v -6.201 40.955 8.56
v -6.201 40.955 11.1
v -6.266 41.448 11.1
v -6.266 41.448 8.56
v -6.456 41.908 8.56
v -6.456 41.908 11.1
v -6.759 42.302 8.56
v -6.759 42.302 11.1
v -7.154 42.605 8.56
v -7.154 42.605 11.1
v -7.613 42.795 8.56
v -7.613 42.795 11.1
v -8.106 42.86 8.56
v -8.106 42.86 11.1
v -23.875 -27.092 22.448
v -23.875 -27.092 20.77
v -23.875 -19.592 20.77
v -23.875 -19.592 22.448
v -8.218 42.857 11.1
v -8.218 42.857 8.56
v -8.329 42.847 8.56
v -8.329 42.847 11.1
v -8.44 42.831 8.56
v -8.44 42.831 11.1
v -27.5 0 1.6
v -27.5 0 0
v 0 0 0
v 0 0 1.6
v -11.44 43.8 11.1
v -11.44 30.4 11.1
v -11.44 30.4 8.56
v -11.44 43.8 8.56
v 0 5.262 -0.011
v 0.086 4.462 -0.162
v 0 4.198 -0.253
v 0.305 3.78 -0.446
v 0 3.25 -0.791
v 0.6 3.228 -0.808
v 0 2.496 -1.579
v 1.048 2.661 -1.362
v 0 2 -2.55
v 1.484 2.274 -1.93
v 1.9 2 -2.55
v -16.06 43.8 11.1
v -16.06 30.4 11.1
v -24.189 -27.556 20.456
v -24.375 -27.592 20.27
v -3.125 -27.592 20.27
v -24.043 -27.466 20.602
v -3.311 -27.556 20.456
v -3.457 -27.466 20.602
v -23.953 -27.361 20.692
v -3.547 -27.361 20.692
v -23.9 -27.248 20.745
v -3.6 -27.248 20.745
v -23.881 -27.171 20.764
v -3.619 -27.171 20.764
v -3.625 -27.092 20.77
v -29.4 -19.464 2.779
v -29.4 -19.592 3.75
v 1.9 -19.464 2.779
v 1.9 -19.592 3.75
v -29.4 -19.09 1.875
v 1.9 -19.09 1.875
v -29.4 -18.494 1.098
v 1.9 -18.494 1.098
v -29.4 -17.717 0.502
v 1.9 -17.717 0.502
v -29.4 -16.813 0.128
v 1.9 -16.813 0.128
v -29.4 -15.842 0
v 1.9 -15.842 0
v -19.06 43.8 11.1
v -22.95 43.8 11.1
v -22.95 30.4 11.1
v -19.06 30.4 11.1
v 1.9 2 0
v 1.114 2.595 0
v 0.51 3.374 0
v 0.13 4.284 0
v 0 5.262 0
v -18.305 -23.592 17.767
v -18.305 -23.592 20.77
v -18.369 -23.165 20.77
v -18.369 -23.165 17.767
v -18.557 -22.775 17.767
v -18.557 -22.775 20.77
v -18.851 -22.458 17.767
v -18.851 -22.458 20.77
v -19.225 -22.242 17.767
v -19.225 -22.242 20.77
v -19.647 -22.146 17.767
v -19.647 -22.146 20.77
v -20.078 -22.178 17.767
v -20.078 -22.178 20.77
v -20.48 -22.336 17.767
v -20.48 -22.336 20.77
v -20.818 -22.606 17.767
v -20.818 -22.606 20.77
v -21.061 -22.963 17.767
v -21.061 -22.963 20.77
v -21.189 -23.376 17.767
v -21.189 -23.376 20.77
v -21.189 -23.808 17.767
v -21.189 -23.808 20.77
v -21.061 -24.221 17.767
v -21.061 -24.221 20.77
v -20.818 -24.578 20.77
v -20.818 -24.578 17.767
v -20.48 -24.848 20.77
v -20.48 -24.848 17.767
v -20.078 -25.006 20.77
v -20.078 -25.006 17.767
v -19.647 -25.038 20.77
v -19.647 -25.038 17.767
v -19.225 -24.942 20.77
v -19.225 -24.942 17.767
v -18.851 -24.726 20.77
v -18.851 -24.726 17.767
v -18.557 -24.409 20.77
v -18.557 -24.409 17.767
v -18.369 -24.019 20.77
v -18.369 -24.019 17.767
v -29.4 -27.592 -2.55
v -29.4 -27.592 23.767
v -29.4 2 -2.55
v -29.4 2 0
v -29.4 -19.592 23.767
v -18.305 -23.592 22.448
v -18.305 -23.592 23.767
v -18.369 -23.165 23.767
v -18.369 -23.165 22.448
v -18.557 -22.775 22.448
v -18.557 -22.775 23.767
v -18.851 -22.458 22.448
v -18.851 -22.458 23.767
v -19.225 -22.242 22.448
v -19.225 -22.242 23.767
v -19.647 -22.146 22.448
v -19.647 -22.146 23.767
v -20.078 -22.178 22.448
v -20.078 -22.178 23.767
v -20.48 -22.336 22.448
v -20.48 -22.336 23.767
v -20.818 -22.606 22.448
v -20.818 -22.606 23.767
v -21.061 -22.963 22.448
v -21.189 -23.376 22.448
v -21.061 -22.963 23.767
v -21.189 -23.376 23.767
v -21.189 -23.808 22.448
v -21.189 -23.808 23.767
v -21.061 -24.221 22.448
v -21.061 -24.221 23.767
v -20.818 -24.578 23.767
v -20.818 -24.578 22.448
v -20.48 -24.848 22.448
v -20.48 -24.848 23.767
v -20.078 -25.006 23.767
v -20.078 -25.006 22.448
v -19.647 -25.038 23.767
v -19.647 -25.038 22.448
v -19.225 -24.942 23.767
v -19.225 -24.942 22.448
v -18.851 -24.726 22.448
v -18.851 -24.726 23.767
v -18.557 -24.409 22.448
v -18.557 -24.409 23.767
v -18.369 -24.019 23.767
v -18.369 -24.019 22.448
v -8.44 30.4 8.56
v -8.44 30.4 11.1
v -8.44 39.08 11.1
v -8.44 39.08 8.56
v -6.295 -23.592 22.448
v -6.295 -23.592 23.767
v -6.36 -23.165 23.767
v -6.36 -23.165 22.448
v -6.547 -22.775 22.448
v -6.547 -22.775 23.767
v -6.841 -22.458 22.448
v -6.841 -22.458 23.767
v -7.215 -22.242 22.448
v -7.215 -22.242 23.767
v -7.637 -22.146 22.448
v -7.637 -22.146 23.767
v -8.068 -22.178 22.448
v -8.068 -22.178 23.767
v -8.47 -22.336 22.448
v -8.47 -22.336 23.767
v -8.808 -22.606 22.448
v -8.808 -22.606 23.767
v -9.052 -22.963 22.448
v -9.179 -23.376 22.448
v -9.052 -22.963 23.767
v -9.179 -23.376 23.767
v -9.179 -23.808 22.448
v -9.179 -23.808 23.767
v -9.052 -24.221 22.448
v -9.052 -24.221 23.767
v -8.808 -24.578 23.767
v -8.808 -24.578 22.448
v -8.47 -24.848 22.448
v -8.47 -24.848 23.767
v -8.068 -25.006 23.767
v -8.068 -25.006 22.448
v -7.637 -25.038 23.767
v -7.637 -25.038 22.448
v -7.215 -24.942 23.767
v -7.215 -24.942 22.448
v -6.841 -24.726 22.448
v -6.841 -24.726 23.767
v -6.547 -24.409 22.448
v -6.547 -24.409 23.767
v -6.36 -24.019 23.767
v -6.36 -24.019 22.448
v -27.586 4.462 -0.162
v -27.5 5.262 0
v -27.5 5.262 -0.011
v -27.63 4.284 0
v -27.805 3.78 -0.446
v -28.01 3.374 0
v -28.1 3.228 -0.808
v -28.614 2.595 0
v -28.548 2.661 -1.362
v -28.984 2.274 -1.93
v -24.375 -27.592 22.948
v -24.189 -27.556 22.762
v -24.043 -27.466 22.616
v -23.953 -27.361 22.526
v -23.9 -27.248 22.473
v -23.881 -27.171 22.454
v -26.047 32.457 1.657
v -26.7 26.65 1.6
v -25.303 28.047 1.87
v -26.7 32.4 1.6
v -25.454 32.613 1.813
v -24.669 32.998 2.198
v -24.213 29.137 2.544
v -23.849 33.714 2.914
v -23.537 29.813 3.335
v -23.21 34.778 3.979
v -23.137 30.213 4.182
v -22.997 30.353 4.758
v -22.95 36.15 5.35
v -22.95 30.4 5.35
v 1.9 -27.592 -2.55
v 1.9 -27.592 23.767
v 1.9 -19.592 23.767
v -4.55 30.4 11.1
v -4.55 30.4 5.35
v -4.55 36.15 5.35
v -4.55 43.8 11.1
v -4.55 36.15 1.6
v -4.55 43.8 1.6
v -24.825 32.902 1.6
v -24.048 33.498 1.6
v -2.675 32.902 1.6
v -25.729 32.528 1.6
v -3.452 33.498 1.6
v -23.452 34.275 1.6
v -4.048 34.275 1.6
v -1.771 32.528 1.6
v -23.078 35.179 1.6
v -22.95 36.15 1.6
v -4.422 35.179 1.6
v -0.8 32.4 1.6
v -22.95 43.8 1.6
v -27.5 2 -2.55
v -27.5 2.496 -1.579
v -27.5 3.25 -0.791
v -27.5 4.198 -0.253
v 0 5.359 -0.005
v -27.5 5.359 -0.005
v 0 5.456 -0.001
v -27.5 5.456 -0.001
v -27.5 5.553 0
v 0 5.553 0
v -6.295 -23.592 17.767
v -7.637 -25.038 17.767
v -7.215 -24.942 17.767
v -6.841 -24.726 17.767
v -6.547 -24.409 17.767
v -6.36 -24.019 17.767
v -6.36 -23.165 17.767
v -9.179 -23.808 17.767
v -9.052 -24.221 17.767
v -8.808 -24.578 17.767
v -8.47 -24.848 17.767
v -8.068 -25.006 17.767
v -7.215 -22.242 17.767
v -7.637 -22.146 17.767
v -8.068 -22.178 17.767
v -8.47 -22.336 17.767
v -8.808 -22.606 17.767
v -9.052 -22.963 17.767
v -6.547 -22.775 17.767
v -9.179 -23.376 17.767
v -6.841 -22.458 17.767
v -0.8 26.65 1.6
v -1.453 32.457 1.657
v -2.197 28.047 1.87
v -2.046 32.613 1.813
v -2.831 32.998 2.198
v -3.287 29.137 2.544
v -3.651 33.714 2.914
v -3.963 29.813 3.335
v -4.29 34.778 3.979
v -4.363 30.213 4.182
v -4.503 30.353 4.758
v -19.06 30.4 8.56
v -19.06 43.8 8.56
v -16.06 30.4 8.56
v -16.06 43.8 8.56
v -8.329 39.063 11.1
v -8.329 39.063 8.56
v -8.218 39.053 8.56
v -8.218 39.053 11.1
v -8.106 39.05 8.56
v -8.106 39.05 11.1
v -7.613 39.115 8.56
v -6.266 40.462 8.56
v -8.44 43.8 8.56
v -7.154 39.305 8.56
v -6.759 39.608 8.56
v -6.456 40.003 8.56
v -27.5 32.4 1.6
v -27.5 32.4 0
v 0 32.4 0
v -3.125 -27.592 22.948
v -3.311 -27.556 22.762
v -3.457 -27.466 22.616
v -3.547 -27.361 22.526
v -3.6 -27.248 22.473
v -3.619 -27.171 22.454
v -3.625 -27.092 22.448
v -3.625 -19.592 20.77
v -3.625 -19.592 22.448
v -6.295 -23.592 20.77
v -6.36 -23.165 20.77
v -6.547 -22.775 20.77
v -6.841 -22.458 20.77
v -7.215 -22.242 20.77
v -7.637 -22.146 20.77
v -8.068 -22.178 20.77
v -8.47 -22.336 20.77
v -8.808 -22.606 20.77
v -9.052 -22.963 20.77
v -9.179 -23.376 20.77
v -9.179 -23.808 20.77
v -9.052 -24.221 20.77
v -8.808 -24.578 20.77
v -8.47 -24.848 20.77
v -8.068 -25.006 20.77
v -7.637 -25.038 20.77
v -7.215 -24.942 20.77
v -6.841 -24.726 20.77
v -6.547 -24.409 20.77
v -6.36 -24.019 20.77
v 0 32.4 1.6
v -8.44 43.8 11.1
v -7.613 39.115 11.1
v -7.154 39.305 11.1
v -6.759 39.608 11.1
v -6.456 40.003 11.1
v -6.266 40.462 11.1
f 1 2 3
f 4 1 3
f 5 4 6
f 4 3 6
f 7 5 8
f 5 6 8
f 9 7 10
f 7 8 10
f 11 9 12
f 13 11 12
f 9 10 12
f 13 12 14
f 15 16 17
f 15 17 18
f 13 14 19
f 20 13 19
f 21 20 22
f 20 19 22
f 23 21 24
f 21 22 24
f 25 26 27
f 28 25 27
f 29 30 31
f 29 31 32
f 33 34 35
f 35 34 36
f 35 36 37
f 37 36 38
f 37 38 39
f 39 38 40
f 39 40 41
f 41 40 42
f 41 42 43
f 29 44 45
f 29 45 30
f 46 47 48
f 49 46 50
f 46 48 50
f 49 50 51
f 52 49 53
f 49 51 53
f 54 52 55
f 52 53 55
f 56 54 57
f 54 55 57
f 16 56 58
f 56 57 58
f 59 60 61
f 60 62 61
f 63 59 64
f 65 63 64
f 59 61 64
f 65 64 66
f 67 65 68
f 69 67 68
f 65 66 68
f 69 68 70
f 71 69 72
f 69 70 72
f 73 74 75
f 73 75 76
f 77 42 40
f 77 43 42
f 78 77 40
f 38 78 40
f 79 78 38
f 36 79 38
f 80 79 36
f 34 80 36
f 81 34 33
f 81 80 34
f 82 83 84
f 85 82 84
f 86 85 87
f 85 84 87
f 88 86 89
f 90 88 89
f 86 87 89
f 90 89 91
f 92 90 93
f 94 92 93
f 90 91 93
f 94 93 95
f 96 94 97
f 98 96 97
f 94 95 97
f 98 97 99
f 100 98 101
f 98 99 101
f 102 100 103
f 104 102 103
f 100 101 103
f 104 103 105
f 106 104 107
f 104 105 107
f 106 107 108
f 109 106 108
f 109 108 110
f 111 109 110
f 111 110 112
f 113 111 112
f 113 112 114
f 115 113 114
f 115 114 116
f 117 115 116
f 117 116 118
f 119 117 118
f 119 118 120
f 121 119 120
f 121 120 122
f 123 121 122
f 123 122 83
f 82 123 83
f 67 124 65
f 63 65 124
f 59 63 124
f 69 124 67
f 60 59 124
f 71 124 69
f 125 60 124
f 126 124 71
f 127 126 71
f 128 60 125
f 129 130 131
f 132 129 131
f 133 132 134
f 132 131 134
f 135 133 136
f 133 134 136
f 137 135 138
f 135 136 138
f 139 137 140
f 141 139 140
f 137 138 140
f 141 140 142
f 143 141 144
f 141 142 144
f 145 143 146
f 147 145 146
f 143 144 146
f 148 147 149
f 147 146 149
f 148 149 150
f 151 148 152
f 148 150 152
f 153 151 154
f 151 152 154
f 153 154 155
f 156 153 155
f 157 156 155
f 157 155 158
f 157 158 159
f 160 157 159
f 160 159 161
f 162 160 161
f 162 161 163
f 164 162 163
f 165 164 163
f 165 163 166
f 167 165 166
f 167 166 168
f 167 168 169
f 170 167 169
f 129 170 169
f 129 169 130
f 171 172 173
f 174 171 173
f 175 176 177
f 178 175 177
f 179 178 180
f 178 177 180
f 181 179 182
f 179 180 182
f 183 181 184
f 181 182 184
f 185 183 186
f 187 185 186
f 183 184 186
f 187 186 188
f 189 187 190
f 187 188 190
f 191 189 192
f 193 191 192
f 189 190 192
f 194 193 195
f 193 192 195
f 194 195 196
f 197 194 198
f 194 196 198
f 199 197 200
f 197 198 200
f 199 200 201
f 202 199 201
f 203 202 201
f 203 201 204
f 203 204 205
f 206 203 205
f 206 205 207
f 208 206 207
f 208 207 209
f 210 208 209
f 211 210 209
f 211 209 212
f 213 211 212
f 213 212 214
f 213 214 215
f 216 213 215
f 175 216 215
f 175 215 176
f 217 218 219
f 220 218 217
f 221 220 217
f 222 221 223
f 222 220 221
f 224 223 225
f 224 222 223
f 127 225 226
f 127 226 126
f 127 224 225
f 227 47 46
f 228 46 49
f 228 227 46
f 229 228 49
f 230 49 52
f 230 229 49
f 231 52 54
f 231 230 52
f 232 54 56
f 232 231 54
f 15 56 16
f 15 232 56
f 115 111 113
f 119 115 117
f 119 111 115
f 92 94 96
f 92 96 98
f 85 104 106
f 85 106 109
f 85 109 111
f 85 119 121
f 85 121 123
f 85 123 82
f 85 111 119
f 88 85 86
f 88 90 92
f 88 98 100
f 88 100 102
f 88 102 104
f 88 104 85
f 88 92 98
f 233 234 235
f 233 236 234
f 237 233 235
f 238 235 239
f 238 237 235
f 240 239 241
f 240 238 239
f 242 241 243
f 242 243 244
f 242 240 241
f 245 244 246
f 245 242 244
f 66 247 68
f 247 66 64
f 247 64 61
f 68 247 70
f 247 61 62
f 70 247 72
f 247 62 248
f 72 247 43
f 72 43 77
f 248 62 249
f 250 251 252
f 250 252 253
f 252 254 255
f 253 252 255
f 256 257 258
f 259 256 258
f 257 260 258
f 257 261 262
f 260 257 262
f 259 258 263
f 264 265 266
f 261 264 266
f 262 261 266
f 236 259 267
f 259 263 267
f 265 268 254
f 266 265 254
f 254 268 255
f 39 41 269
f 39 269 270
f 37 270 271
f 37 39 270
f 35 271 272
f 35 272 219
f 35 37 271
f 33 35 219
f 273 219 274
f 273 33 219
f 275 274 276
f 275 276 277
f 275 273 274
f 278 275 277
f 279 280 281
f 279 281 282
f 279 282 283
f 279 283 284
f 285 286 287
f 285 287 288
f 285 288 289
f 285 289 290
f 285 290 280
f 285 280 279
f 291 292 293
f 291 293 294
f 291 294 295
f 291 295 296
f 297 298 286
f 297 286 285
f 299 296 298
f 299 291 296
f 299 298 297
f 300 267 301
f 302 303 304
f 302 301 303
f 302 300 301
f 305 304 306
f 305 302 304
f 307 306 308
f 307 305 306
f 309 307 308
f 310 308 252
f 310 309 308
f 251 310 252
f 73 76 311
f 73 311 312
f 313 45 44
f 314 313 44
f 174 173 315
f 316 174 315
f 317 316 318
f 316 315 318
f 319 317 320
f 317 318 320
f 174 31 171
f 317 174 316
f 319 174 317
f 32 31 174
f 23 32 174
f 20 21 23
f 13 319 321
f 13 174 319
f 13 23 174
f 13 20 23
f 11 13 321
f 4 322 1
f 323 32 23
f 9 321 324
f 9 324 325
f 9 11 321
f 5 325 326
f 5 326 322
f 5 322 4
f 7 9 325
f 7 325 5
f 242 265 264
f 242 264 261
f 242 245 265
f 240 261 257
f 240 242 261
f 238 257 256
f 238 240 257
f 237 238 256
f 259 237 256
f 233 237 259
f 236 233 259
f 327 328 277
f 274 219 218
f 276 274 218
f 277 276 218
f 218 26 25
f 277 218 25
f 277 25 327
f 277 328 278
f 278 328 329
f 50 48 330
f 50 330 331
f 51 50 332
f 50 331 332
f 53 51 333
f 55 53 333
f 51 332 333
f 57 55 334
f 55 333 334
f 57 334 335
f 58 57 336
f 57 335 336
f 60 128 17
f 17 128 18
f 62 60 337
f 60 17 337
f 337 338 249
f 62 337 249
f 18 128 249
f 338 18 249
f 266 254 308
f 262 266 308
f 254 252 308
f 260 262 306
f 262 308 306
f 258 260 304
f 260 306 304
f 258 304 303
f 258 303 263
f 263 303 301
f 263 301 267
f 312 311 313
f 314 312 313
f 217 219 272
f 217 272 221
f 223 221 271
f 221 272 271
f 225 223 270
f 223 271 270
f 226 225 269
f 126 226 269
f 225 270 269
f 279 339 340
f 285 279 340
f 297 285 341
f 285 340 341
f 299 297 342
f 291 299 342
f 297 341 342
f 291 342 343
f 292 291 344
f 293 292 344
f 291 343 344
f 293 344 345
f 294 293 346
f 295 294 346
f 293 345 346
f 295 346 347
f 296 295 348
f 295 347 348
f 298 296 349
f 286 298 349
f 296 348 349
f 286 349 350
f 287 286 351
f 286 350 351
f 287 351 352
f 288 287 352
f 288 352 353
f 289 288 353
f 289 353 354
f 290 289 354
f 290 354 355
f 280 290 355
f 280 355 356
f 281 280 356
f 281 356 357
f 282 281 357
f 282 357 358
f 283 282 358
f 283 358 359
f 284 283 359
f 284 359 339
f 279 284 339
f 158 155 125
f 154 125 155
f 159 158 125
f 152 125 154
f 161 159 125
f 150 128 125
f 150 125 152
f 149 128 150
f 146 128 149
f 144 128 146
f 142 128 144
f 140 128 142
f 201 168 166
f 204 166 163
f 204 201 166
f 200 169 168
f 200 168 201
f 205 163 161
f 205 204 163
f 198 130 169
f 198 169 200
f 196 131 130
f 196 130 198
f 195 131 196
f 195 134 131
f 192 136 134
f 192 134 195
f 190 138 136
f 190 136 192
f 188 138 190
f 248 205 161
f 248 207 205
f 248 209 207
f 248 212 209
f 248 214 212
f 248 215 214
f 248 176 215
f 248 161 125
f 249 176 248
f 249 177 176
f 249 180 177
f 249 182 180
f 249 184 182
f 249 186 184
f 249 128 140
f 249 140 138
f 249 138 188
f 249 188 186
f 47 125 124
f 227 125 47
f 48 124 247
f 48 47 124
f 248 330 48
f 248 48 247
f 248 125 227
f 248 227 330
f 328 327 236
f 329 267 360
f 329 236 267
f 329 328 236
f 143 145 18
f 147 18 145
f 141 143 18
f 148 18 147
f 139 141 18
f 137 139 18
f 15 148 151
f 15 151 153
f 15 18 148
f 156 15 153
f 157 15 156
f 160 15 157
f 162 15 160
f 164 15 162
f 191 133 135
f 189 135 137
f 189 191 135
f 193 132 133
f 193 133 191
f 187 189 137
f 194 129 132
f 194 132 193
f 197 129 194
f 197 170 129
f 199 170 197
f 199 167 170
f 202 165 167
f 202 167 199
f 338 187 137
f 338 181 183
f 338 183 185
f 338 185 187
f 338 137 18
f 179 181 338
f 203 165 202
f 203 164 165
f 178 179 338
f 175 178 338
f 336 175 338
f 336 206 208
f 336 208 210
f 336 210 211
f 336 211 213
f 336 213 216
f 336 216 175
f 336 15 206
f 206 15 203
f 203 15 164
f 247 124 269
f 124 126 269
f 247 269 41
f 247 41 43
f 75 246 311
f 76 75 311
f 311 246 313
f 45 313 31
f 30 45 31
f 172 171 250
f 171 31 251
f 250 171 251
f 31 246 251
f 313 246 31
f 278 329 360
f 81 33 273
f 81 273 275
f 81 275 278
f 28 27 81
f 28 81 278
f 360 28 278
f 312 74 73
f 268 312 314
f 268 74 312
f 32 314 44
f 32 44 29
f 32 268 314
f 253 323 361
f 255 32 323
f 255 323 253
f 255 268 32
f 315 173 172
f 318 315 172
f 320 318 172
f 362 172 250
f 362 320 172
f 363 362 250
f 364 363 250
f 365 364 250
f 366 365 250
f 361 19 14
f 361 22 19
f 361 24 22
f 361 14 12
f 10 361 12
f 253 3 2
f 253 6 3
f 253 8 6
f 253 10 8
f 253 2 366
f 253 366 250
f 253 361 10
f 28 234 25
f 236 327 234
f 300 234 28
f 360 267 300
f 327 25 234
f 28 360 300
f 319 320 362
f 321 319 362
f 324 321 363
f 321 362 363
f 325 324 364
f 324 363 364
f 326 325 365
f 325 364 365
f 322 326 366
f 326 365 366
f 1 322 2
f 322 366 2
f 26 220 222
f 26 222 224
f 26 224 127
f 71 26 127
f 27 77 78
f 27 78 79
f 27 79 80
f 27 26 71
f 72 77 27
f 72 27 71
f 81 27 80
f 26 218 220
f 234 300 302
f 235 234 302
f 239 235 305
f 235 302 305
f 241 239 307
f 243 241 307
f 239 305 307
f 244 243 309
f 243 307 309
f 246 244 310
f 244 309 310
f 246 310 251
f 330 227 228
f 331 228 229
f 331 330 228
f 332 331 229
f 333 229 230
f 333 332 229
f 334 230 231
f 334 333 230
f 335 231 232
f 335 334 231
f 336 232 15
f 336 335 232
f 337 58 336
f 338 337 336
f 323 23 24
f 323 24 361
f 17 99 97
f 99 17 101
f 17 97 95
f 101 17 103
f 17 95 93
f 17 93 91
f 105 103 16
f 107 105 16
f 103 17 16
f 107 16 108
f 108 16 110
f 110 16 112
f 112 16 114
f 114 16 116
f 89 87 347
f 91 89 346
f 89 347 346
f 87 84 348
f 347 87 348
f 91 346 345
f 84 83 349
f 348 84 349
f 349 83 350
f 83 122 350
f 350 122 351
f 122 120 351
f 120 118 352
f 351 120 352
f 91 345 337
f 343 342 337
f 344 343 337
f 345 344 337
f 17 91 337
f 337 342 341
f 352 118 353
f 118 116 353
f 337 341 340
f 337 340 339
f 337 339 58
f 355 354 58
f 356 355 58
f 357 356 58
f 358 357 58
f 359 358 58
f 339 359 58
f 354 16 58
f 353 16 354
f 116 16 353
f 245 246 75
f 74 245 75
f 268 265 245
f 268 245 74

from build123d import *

# Parameters (mm, degrees)
SKETCH1_W           = 27.5
SKETCH1_H           = 32.4
BOSS_EXTRUDE1_DEPTH = 1.6
SKETCH2_W           = 18.4
SKETCH2_H           = 13.4
BOSS_EXTRUDE2_DEPTH = 9.5
SKETCH3_W           = 31.3
SKETCH3_H           = 19.46
BOSS_EXTRUDE3_DEPTH = 2.55
SKETCH6_W           = 3
SKETCH6_H           = 13.4
CUT_EXTRUDE1_DEPTH  = 2.54
CUT_EXTRUDE2_DEPTH  = 2.54
SKETCH9_W           = 31.3
SKETCH9_H           = 2.55
BOSS_EXTRUDE4_DEPTH = 2.132
SKETCH11_W          = 31.3
SKETCH11_H          = 26.3172
BOSS_EXTRUDE5_DEPTH = 8
SKETCH12_W          = 20.25
SKETCH12_H          = 1.678
CUT_EXTRUDE3_DEPTH  = 8
FILLET1_R           = 0.5
SKETCH13_R          = 1.45
CUT_EXTRUDE4_DEPTH  = 6
FILLET2_R           = 3.75
FILLET3_R           = 3.75
FILLET4_R           = 3.75
FILLET5_R           = 3.75
FILLET6_R           = 3.75
FILLET7_R           = 3.75
FILLET8_R           = 3.75
FILLET9_R           = 3.75


# Some blends are built 0.0001 mm under size
with BuildPart() as part:
    # Sketch1 → Boss-Extrude1 (new body)
    with BuildSketch(Plane.XY):
        with Locations((-13.75, 16.2)):
            Rectangle(SKETCH1_W, SKETCH1_H)
    extrude(amount=BOSS_EXTRUDE1_DEPTH)

    # Sketch2 → Boss-Extrude2 (add)
    with BuildSketch(Plane.XY.offset(1.6)):
        with Locations((-13.75, 37.1)):
            Rectangle(SKETCH2_W, SKETCH2_H)
    extrude(amount=BOSS_EXTRUDE2_DEPTH)

    # Sketch3 → Boss-Extrude3 (add)
    with BuildSketch(Plane(origin=(0, 0, 0), x_dir=(-1, 0, 0), z_dir=(0, 0, -1))):
        with Locations((13.75, -7.73)):
            Rectangle(SKETCH3_W, SKETCH3_H)
    extrude(amount=BOSS_EXTRUDE3_DEPTH)

    # Sketch6 → Cut-Extrude1 (cut)
    with BuildSketch(Plane.XY.offset(11.1)):
        with Locations((-17.56, 37.1)):
            Rectangle(SKETCH6_W, SKETCH6_H)
        with Locations((-9.94, 37.1)):
            Rectangle(SKETCH6_W, SKETCH6_H)
    extrude(amount=-CUT_EXTRUDE1_DEPTH, mode=Mode.SUBTRACT)

    # Sketch7 → Cut-Extrude2 (cut)
    with BuildSketch(Plane.XY.offset(11.1)):
        with BuildLine():
            Line((-8.44, 40.9552), (-8.44, 42.830691669))
            ThreePointArc((-8.44, 42.830691669), (-9.566358689, 42.178465098), (-10.011, 40.9552))
            Line((-10.011, 40.9552), (-8.44, 40.9552))
        make_face()
        with BuildLine():
            Line((-8.44, 39.079708331), (-8.44, 40.9552))
            Line((-8.44, 40.9552), (-10.011, 40.9552))
            ThreePointArc((-10.011, 40.9552), (-9.566358689, 39.731934902), (-8.44, 39.079708331))
        make_face()
        with BuildLine():
            ThreePointArc((-6.201, 40.9552), (-6.758961582, 42.302238418), (-8.106, 42.8602))
            Line((-8.106, 42.8602), (-8.106, 40.9552))
            Line((-8.106, 40.9552), (-6.201, 40.9552))
        make_face()
        with BuildLine():
            Line((-6.201, 40.9552), (-8.106, 40.9552))
            Line((-8.106, 40.9552), (-8.106, 39.0502))
            ThreePointArc((-8.106, 39.0502), (-6.758961582, 39.608161582), (-6.201, 40.9552))
        make_face()
        with BuildLine():
            Line((-8.106, 40.9552), (-8.106, 42.8602))
            ThreePointArc((-8.106, 42.8602), (-8.273650486, 42.852808578), (-8.44, 42.830691669))
            Line((-8.44, 42.830691669), (-8.44, 40.9552))
            Line((-8.44, 40.9552), (-8.106, 40.9552))
        make_face()
        with BuildLine():
            Line((-8.106, 39.0502), (-8.106, 40.9552))
            Line((-8.106, 40.9552), (-8.44, 40.9552))
            Line((-8.44, 40.9552), (-8.44, 39.079708331))
            ThreePointArc((-8.44, 39.079708331), (-8.273650486, 39.057591422), (-8.106, 39.0502))
        make_face()
    extrude(amount=-CUT_EXTRUDE2_DEPTH, mode=Mode.SUBTRACT)

    # Sketch9 → Boss-Extrude4 (add)
    with BuildSketch(Plane.XZ.offset(17.46)):
        with Locations((-13.75, -1.275)):
            Rectangle(SKETCH9_W, SKETCH9_H)
    extrude(amount=BOSS_EXTRUDE4_DEPTH)

    # Sketch11 → Boss-Extrude5 (add)
    with BuildSketch(Plane.XZ.offset(19.592)):
        with Locations((-13.75, 10.6086)):
            Rectangle(SKETCH11_W, SKETCH11_H)
    extrude(amount=BOSS_EXTRUDE5_DEPTH)

    # Sketch12 → Cut-Extrude3 (cut)
    with BuildSketch(Plane.XZ.offset(27.592)):
        with Locations((-13.75, 21.609)):
            Rectangle(SKETCH12_W, SKETCH12_H)
    extrude(amount=-CUT_EXTRUDE3_DEPTH, mode=Mode.SUBTRACT)

    # Fillet1
    fillet1_edges = [part.edges().sort_by_distance(p)[0] for p in [
        (-23.875, -27.592, 21.609),
        (-13.75, -27.592, 20.77),
        (-3.625, -27.592, 21.609),
        (-13.75, -27.592, 22.448),
    ]]
    fillet(fillet1_edges, radius=FILLET1_R)

    # Sketch13 → Cut-Extrude4 (cut)
    with BuildSketch(Plane.XY.offset(23.7672)):
        with Locations((-19.7549, -23.592)):
            Circle(SKETCH13_R)
        with Locations((-7.7451, -23.592)):
            Circle(SKETCH13_R)
    extrude(amount=-CUT_EXTRUDE4_DEPTH, mode=Mode.SUBTRACT)

    # Fillet2
    fillet2_edges = [part.edges().sort_by_distance(p)[0] for p in [
        (-13.75, -19.592, 0),
    ]]
    fillet(fillet2_edges, radius=FILLET2_R)

    # Fillet3
    # the kernel refuses this fillet: 3.75 mm, written as the material it adds along each edge
    with BuildSketch(Plane(origin=(0, 2, 0), x_dir=(0, 0, -1), z_dir=(-1, 0, 0))) as fillet3_piece_1:
        with BuildLine():
            CenterArc((3.75, -3.552815785), FILLET3_R, 108.662924885, 71.337075115)
            Line((0, -3.552815785), (0, 0))
            Line((0, 0), (2.55, 0))
        make_face()
    extrude(amount=27.5)

    # Fillet4
    fillet4_edges = [part.edges().sort_by_distance(p)[0] for p in [
        (-13.75, 30.4, 1.6),
    ]]
    fillet(fillet4_edges, radius=FILLET4_R)

    # Fillet5
    fillet5_edges = [part.edges().sort_by_distance(p)[0] for p in [
        (-22.95, 29.525, 1.6),
    ]]
    fillet(fillet5_edges, radius=FILLET5_R)

    # Fillet6
    fillet6_edges = [part.edges().sort_by_distance(p)[0] for p in [
        (-4.55, 29.525, 1.6),
    ]]
    fillet(fillet6_edges, radius=FILLET6_R)

    # Fillet7
    fillet7_edges = [part.edges().sort_by_distance(p)[0] for p in [
        (-22.95, 32.4, 3.475),
    ]]
    fillet(fillet7_edges, radius=FILLET7_R - 0.0001)  # a hair under: the kernel refuses the full size

    # Fillet8
    fillet8_edges = [part.edges().sort_by_distance(p)[0] for p in [
        (-4.55, 32.4, 3.475),
    ]]
    fillet(fillet8_edges, radius=FILLET8_R - 0.0001)  # a hair under: the kernel refuses the full size

    # Fillet9
    # the kernel refuses this fillet: 3.75 mm, written as the material it adds along each edge
    with BuildSketch(Plane(origin=(0, 2, 0), x_dir=(1, 0, 0), z_dir=(0, 0, -1))) as fillet9_piece_1_section:
        with BuildLine():
            CenterArc((3.75, -3.261901286), FILLET9_R, 119.559908379, 60.440091621)
            Line((0, -3.261901286), (0, 0))
            Line((0, 0), (1.9, 0))
        make_face()
    fillet9_piece_1 = extrude(amount=2.55, mode=Mode.PRIVATE)
    fillet9_piece_1 = fillet9_piece_1 - Plane(origin=(1.353199259, 5.552815785, -3.75), x_dir=(0, 0, -1), z_dir=(1, 0, 0)) * Cylinder(3.75, 19, mode=Mode.PRIVATE)
    add(fillet9_piece_1)
    with BuildSketch(Plane(origin=(-27.5, 2, 0), x_dir=(0, 1, 0), z_dir=(0, 0, -1))) as fillet9_piece_2_section:
        with BuildLine():
            CenterArc((3.261901286, -3.75), FILLET9_R, 90, 60.440091621)
            Line((0, -1.9), (0, 0))
            Line((0, 0), (3.261901286, 0))
        make_face()
    fillet9_piece_2 = extrude(amount=2.55, mode=Mode.PRIVATE)
    fillet9_piece_2 = fillet9_piece_2 - Plane(origin=(-28.00314891, 5.552815785, -3.75), x_dir=(0, 0, -1), z_dir=(1, 0, 0)) * Cylinder(3.75, 19, mode=Mode.PRIVATE)
    add(fillet9_piece_2)


solid = part.part
